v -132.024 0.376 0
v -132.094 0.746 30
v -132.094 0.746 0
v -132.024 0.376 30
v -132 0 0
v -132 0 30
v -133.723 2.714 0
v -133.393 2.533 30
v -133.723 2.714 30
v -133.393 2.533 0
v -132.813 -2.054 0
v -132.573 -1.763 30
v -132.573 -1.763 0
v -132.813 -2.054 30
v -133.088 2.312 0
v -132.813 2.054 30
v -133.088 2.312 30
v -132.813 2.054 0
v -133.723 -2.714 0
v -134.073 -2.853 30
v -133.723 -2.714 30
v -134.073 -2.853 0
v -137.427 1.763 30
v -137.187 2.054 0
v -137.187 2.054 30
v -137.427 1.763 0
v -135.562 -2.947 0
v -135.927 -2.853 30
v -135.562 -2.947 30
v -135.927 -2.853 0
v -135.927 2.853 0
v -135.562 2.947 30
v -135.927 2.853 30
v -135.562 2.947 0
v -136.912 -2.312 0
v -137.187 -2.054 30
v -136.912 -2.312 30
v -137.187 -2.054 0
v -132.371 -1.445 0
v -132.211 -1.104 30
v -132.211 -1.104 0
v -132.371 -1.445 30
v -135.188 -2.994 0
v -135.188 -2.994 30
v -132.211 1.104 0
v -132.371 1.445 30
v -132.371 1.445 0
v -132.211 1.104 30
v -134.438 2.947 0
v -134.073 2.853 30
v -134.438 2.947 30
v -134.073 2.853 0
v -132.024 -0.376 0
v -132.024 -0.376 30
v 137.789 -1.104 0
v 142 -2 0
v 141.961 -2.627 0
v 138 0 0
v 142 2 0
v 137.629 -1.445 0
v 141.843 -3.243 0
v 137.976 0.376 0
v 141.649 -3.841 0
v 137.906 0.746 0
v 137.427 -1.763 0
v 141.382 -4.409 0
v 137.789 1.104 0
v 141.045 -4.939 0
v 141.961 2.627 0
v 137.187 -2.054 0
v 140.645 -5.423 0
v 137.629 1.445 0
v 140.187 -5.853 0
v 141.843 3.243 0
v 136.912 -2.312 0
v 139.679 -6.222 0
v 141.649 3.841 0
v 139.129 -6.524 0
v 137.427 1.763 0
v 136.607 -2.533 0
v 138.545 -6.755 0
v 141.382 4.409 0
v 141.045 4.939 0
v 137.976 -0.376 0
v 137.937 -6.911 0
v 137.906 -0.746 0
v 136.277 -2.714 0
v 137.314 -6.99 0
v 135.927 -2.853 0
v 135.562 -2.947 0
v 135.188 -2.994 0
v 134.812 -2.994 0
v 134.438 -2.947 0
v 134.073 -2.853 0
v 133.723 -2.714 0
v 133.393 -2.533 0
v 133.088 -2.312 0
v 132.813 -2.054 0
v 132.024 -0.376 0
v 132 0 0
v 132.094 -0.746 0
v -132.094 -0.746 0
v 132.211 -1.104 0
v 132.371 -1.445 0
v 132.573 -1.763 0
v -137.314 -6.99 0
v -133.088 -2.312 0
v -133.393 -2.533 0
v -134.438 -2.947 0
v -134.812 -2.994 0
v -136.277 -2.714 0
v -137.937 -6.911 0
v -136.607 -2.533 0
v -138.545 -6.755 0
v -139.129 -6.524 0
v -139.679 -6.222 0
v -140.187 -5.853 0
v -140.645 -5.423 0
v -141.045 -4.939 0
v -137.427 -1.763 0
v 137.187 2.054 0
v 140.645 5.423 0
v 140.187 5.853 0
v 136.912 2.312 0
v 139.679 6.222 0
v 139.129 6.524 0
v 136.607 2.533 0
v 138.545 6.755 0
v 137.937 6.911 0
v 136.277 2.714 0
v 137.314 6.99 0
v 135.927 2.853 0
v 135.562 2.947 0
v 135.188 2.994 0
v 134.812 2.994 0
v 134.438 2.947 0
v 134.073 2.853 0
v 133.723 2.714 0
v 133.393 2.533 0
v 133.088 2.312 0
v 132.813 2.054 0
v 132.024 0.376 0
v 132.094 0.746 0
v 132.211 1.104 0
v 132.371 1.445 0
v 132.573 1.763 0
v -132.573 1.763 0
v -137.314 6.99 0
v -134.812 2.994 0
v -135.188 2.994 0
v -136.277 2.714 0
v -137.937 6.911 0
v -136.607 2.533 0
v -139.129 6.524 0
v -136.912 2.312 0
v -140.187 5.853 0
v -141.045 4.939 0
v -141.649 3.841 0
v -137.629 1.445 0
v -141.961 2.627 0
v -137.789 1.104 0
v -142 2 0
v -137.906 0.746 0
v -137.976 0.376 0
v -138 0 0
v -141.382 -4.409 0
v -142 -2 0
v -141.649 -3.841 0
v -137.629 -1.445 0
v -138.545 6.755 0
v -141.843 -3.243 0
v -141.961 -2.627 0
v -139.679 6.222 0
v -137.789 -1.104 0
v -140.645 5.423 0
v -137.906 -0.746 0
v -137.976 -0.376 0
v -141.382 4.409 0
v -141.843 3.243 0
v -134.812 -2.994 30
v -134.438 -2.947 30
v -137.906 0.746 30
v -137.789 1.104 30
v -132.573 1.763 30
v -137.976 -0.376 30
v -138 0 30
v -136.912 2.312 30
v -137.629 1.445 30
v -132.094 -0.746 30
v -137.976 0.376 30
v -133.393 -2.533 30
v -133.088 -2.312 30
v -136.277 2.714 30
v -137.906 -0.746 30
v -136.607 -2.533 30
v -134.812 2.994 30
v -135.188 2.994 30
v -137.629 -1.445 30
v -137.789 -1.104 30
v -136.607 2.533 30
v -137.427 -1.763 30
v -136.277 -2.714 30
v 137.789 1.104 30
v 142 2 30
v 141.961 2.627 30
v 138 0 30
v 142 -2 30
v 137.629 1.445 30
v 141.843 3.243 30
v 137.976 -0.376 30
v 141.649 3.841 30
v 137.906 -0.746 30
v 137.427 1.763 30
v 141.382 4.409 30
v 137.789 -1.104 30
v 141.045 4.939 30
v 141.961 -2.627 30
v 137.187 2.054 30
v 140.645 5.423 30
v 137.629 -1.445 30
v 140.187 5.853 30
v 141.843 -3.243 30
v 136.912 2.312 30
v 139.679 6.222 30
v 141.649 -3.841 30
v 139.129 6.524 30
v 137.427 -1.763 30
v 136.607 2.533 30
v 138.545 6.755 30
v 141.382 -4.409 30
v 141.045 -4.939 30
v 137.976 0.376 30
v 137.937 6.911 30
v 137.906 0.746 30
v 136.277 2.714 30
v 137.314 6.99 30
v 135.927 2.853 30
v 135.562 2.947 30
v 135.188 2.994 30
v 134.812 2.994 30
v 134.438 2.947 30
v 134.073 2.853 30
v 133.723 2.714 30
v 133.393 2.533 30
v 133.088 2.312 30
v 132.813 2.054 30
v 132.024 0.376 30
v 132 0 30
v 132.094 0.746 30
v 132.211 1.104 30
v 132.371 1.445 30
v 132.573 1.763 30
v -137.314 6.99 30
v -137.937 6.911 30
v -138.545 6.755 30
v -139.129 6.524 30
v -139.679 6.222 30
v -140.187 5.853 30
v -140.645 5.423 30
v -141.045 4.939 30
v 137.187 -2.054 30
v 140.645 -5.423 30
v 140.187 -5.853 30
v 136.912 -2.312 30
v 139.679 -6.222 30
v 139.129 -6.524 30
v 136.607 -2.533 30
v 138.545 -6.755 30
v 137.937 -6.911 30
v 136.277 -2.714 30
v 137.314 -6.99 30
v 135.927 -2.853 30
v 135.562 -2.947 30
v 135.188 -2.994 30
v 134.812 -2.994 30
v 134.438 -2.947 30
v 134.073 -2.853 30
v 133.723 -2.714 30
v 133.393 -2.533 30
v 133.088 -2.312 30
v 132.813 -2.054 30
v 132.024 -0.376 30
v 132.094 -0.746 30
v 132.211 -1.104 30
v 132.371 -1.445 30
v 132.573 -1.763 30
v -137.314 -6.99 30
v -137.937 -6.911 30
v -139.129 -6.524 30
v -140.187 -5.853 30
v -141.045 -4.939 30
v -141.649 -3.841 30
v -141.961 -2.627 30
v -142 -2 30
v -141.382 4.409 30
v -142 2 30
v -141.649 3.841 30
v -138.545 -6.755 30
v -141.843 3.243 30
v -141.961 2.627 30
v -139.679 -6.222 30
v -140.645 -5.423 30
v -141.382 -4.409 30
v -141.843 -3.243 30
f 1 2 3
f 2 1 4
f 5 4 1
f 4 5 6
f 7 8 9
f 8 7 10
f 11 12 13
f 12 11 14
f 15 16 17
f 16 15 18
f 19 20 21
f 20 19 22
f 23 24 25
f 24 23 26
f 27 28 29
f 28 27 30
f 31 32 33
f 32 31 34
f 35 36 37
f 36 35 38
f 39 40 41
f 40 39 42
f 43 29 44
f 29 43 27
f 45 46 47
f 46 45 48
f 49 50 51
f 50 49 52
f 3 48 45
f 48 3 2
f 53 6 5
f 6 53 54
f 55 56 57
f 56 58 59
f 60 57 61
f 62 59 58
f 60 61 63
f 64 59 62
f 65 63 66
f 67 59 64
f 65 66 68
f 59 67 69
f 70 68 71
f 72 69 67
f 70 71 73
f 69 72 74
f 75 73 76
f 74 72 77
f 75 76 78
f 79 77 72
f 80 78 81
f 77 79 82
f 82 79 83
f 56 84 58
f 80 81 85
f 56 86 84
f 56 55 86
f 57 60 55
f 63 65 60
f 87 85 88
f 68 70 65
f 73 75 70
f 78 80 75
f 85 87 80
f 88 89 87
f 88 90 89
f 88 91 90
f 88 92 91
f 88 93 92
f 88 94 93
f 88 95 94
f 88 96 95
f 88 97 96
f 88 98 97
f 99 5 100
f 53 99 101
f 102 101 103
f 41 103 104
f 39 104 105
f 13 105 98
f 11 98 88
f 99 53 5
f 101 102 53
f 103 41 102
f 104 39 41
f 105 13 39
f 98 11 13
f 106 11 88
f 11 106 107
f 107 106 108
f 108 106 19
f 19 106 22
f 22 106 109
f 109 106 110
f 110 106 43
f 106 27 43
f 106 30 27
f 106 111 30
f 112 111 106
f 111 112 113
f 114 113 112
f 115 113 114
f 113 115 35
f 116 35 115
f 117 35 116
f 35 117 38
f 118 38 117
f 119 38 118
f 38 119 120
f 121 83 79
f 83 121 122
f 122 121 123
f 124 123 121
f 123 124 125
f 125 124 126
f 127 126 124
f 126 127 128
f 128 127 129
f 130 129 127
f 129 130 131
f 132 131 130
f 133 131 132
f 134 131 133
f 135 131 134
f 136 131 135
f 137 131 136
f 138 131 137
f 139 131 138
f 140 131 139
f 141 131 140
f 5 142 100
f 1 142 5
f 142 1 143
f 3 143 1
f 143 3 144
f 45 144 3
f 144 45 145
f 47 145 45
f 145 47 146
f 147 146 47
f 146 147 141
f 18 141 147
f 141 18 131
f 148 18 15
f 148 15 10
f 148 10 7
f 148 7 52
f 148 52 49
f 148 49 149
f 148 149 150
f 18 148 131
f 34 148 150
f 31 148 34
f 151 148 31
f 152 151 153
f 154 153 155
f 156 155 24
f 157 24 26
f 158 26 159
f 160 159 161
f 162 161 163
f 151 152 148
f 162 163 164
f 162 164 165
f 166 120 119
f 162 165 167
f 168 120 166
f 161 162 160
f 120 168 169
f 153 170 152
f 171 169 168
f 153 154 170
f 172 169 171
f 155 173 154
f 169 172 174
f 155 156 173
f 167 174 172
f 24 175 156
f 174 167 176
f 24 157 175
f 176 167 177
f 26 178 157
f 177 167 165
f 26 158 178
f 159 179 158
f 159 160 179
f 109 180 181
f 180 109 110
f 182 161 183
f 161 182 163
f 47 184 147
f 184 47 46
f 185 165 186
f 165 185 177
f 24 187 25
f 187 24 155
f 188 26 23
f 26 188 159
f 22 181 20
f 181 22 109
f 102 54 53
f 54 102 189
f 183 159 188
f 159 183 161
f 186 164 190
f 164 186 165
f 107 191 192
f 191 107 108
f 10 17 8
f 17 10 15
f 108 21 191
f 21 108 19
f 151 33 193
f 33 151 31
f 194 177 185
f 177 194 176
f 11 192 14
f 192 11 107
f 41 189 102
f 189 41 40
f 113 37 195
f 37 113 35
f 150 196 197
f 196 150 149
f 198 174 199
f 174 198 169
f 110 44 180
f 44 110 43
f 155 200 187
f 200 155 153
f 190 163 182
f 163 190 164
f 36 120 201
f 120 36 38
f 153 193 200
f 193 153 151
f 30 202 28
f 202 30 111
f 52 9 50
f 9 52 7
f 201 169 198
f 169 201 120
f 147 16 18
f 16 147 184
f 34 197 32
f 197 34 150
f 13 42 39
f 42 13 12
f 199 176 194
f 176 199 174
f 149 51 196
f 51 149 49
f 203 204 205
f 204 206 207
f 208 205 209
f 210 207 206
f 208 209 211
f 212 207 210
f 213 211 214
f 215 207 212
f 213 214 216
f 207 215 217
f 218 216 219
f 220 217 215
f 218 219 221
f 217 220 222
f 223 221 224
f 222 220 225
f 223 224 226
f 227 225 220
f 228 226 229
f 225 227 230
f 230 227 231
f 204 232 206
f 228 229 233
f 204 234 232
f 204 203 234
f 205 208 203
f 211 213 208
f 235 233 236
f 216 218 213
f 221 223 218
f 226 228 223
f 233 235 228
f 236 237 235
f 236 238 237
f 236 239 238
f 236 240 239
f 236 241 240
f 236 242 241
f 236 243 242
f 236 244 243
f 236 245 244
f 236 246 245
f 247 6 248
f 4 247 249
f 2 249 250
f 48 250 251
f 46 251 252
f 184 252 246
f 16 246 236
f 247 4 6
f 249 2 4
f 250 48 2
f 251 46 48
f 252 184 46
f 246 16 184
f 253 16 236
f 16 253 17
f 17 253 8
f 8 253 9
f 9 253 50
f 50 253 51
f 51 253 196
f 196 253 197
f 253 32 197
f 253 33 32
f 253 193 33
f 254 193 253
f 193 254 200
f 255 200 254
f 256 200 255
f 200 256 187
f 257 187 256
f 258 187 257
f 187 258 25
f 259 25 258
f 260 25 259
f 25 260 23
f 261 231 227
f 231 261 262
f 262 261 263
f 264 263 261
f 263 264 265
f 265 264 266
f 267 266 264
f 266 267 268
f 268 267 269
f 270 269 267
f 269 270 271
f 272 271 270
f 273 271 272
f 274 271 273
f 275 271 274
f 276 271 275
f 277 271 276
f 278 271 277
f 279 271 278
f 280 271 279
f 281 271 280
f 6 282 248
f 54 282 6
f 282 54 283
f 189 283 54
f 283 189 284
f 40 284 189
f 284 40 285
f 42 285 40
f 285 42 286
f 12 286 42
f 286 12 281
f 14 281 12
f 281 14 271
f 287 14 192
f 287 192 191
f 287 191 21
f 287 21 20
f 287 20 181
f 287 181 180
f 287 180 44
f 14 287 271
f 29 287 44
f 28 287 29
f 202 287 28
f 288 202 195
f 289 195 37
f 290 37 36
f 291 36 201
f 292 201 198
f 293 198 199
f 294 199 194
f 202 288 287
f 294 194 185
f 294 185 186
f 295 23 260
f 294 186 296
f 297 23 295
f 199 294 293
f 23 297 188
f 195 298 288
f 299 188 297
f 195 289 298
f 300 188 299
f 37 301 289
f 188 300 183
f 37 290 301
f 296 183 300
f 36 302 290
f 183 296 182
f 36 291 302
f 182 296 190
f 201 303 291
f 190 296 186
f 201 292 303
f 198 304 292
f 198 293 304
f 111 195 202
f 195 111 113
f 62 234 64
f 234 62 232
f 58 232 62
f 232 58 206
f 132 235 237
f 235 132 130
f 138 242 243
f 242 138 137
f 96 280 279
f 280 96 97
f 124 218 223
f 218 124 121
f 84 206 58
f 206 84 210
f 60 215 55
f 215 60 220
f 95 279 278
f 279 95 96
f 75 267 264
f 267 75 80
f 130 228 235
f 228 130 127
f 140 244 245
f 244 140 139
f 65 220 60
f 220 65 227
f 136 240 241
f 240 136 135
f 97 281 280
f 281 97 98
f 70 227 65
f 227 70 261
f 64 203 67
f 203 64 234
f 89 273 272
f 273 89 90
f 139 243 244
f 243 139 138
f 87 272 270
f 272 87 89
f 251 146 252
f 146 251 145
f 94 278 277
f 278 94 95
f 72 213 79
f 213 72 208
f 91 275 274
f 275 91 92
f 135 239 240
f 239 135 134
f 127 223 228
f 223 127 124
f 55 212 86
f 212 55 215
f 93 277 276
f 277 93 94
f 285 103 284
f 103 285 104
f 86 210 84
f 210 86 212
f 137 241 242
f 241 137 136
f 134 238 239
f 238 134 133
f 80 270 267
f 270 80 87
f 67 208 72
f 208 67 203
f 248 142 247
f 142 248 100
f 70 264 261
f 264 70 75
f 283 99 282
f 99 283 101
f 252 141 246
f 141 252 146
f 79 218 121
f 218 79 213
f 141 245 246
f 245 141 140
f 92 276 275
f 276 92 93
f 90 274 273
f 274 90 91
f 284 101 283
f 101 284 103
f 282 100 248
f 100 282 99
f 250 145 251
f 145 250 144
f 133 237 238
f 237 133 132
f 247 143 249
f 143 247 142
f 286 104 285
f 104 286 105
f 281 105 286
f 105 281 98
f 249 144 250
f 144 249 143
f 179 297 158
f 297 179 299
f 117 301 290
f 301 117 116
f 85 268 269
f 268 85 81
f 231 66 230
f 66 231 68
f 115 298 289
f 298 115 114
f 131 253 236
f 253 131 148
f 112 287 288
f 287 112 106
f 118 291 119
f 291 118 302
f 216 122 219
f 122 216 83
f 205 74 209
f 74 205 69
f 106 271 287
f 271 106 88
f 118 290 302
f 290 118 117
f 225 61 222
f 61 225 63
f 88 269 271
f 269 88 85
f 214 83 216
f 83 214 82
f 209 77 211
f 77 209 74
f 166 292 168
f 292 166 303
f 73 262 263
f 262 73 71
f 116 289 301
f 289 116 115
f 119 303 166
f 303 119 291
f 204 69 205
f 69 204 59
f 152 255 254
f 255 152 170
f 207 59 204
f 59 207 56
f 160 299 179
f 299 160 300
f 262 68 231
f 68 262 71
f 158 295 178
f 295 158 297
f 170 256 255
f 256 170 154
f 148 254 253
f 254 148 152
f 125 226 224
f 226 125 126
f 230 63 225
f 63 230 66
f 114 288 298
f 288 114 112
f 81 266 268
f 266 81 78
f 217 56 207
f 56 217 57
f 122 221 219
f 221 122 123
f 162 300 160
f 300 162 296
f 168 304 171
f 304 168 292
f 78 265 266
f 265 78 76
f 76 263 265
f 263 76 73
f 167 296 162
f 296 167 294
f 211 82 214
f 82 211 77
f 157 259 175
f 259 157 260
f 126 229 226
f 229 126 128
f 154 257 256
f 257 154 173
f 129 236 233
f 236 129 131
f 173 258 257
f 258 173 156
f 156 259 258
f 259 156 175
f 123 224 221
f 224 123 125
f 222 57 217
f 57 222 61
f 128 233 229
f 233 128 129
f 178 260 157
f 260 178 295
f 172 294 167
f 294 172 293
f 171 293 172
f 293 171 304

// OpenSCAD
$fn = 50;


difference() {
	union() {
		hull() {
			translate(v = [-137.0000000000, 2.0000000000, 0]) {
				cylinder(h = 30, r = 5);
			}
			translate(v = [137.0000000000, 2.0000000000, 0]) {
				cylinder(h = 30, r = 5);
			}
			translate(v = [-137.0000000000, -2.0000000000, 0]) {
				cylinder(h = 30, r = 5);
			}
			translate(v = [137.0000000000, -2.0000000000, 0]) {
				cylinder(h = 30, r = 5);
			}
		}
	}
	union() {
		translate(v = [-135.0000000000, 0.0000000000, 0]) {
			cylinder(h = 30, r = 3.0000000000);
		}
		translate(v = [135.0000000000, 0.0000000000, 0]) {
			cylinder(h = 30, r = 3.0000000000);
		}
		translate(v = [-135.0000000000, 0.0000000000, 0]) {
			cylinder(h = 30, r = 1.5000000000);
		}
		translate(v = [135.0000000000, 0.0000000000, 0]) {
			cylinder(h = 30, r = 1.5000000000);
		}
		translate(v = [-135.0000000000, 0.0000000000, 0]) {
			cylinder(h = 30, r = 1.5000000000);
		}
		translate(v = [135.0000000000, 0.0000000000, 0]) {
			cylinder(h = 30, r = 1.5000000000);
		}
		translate(v = [-135.0000000000, 0.0000000000, 0]) {
			cylinder(h = 30, r = 1.5000000000);
		}
		translate(v = [135.0000000000, 0.0000000000, 0]) {
			cylinder(h = 30, r = 1.5000000000);
		}
	}
}
